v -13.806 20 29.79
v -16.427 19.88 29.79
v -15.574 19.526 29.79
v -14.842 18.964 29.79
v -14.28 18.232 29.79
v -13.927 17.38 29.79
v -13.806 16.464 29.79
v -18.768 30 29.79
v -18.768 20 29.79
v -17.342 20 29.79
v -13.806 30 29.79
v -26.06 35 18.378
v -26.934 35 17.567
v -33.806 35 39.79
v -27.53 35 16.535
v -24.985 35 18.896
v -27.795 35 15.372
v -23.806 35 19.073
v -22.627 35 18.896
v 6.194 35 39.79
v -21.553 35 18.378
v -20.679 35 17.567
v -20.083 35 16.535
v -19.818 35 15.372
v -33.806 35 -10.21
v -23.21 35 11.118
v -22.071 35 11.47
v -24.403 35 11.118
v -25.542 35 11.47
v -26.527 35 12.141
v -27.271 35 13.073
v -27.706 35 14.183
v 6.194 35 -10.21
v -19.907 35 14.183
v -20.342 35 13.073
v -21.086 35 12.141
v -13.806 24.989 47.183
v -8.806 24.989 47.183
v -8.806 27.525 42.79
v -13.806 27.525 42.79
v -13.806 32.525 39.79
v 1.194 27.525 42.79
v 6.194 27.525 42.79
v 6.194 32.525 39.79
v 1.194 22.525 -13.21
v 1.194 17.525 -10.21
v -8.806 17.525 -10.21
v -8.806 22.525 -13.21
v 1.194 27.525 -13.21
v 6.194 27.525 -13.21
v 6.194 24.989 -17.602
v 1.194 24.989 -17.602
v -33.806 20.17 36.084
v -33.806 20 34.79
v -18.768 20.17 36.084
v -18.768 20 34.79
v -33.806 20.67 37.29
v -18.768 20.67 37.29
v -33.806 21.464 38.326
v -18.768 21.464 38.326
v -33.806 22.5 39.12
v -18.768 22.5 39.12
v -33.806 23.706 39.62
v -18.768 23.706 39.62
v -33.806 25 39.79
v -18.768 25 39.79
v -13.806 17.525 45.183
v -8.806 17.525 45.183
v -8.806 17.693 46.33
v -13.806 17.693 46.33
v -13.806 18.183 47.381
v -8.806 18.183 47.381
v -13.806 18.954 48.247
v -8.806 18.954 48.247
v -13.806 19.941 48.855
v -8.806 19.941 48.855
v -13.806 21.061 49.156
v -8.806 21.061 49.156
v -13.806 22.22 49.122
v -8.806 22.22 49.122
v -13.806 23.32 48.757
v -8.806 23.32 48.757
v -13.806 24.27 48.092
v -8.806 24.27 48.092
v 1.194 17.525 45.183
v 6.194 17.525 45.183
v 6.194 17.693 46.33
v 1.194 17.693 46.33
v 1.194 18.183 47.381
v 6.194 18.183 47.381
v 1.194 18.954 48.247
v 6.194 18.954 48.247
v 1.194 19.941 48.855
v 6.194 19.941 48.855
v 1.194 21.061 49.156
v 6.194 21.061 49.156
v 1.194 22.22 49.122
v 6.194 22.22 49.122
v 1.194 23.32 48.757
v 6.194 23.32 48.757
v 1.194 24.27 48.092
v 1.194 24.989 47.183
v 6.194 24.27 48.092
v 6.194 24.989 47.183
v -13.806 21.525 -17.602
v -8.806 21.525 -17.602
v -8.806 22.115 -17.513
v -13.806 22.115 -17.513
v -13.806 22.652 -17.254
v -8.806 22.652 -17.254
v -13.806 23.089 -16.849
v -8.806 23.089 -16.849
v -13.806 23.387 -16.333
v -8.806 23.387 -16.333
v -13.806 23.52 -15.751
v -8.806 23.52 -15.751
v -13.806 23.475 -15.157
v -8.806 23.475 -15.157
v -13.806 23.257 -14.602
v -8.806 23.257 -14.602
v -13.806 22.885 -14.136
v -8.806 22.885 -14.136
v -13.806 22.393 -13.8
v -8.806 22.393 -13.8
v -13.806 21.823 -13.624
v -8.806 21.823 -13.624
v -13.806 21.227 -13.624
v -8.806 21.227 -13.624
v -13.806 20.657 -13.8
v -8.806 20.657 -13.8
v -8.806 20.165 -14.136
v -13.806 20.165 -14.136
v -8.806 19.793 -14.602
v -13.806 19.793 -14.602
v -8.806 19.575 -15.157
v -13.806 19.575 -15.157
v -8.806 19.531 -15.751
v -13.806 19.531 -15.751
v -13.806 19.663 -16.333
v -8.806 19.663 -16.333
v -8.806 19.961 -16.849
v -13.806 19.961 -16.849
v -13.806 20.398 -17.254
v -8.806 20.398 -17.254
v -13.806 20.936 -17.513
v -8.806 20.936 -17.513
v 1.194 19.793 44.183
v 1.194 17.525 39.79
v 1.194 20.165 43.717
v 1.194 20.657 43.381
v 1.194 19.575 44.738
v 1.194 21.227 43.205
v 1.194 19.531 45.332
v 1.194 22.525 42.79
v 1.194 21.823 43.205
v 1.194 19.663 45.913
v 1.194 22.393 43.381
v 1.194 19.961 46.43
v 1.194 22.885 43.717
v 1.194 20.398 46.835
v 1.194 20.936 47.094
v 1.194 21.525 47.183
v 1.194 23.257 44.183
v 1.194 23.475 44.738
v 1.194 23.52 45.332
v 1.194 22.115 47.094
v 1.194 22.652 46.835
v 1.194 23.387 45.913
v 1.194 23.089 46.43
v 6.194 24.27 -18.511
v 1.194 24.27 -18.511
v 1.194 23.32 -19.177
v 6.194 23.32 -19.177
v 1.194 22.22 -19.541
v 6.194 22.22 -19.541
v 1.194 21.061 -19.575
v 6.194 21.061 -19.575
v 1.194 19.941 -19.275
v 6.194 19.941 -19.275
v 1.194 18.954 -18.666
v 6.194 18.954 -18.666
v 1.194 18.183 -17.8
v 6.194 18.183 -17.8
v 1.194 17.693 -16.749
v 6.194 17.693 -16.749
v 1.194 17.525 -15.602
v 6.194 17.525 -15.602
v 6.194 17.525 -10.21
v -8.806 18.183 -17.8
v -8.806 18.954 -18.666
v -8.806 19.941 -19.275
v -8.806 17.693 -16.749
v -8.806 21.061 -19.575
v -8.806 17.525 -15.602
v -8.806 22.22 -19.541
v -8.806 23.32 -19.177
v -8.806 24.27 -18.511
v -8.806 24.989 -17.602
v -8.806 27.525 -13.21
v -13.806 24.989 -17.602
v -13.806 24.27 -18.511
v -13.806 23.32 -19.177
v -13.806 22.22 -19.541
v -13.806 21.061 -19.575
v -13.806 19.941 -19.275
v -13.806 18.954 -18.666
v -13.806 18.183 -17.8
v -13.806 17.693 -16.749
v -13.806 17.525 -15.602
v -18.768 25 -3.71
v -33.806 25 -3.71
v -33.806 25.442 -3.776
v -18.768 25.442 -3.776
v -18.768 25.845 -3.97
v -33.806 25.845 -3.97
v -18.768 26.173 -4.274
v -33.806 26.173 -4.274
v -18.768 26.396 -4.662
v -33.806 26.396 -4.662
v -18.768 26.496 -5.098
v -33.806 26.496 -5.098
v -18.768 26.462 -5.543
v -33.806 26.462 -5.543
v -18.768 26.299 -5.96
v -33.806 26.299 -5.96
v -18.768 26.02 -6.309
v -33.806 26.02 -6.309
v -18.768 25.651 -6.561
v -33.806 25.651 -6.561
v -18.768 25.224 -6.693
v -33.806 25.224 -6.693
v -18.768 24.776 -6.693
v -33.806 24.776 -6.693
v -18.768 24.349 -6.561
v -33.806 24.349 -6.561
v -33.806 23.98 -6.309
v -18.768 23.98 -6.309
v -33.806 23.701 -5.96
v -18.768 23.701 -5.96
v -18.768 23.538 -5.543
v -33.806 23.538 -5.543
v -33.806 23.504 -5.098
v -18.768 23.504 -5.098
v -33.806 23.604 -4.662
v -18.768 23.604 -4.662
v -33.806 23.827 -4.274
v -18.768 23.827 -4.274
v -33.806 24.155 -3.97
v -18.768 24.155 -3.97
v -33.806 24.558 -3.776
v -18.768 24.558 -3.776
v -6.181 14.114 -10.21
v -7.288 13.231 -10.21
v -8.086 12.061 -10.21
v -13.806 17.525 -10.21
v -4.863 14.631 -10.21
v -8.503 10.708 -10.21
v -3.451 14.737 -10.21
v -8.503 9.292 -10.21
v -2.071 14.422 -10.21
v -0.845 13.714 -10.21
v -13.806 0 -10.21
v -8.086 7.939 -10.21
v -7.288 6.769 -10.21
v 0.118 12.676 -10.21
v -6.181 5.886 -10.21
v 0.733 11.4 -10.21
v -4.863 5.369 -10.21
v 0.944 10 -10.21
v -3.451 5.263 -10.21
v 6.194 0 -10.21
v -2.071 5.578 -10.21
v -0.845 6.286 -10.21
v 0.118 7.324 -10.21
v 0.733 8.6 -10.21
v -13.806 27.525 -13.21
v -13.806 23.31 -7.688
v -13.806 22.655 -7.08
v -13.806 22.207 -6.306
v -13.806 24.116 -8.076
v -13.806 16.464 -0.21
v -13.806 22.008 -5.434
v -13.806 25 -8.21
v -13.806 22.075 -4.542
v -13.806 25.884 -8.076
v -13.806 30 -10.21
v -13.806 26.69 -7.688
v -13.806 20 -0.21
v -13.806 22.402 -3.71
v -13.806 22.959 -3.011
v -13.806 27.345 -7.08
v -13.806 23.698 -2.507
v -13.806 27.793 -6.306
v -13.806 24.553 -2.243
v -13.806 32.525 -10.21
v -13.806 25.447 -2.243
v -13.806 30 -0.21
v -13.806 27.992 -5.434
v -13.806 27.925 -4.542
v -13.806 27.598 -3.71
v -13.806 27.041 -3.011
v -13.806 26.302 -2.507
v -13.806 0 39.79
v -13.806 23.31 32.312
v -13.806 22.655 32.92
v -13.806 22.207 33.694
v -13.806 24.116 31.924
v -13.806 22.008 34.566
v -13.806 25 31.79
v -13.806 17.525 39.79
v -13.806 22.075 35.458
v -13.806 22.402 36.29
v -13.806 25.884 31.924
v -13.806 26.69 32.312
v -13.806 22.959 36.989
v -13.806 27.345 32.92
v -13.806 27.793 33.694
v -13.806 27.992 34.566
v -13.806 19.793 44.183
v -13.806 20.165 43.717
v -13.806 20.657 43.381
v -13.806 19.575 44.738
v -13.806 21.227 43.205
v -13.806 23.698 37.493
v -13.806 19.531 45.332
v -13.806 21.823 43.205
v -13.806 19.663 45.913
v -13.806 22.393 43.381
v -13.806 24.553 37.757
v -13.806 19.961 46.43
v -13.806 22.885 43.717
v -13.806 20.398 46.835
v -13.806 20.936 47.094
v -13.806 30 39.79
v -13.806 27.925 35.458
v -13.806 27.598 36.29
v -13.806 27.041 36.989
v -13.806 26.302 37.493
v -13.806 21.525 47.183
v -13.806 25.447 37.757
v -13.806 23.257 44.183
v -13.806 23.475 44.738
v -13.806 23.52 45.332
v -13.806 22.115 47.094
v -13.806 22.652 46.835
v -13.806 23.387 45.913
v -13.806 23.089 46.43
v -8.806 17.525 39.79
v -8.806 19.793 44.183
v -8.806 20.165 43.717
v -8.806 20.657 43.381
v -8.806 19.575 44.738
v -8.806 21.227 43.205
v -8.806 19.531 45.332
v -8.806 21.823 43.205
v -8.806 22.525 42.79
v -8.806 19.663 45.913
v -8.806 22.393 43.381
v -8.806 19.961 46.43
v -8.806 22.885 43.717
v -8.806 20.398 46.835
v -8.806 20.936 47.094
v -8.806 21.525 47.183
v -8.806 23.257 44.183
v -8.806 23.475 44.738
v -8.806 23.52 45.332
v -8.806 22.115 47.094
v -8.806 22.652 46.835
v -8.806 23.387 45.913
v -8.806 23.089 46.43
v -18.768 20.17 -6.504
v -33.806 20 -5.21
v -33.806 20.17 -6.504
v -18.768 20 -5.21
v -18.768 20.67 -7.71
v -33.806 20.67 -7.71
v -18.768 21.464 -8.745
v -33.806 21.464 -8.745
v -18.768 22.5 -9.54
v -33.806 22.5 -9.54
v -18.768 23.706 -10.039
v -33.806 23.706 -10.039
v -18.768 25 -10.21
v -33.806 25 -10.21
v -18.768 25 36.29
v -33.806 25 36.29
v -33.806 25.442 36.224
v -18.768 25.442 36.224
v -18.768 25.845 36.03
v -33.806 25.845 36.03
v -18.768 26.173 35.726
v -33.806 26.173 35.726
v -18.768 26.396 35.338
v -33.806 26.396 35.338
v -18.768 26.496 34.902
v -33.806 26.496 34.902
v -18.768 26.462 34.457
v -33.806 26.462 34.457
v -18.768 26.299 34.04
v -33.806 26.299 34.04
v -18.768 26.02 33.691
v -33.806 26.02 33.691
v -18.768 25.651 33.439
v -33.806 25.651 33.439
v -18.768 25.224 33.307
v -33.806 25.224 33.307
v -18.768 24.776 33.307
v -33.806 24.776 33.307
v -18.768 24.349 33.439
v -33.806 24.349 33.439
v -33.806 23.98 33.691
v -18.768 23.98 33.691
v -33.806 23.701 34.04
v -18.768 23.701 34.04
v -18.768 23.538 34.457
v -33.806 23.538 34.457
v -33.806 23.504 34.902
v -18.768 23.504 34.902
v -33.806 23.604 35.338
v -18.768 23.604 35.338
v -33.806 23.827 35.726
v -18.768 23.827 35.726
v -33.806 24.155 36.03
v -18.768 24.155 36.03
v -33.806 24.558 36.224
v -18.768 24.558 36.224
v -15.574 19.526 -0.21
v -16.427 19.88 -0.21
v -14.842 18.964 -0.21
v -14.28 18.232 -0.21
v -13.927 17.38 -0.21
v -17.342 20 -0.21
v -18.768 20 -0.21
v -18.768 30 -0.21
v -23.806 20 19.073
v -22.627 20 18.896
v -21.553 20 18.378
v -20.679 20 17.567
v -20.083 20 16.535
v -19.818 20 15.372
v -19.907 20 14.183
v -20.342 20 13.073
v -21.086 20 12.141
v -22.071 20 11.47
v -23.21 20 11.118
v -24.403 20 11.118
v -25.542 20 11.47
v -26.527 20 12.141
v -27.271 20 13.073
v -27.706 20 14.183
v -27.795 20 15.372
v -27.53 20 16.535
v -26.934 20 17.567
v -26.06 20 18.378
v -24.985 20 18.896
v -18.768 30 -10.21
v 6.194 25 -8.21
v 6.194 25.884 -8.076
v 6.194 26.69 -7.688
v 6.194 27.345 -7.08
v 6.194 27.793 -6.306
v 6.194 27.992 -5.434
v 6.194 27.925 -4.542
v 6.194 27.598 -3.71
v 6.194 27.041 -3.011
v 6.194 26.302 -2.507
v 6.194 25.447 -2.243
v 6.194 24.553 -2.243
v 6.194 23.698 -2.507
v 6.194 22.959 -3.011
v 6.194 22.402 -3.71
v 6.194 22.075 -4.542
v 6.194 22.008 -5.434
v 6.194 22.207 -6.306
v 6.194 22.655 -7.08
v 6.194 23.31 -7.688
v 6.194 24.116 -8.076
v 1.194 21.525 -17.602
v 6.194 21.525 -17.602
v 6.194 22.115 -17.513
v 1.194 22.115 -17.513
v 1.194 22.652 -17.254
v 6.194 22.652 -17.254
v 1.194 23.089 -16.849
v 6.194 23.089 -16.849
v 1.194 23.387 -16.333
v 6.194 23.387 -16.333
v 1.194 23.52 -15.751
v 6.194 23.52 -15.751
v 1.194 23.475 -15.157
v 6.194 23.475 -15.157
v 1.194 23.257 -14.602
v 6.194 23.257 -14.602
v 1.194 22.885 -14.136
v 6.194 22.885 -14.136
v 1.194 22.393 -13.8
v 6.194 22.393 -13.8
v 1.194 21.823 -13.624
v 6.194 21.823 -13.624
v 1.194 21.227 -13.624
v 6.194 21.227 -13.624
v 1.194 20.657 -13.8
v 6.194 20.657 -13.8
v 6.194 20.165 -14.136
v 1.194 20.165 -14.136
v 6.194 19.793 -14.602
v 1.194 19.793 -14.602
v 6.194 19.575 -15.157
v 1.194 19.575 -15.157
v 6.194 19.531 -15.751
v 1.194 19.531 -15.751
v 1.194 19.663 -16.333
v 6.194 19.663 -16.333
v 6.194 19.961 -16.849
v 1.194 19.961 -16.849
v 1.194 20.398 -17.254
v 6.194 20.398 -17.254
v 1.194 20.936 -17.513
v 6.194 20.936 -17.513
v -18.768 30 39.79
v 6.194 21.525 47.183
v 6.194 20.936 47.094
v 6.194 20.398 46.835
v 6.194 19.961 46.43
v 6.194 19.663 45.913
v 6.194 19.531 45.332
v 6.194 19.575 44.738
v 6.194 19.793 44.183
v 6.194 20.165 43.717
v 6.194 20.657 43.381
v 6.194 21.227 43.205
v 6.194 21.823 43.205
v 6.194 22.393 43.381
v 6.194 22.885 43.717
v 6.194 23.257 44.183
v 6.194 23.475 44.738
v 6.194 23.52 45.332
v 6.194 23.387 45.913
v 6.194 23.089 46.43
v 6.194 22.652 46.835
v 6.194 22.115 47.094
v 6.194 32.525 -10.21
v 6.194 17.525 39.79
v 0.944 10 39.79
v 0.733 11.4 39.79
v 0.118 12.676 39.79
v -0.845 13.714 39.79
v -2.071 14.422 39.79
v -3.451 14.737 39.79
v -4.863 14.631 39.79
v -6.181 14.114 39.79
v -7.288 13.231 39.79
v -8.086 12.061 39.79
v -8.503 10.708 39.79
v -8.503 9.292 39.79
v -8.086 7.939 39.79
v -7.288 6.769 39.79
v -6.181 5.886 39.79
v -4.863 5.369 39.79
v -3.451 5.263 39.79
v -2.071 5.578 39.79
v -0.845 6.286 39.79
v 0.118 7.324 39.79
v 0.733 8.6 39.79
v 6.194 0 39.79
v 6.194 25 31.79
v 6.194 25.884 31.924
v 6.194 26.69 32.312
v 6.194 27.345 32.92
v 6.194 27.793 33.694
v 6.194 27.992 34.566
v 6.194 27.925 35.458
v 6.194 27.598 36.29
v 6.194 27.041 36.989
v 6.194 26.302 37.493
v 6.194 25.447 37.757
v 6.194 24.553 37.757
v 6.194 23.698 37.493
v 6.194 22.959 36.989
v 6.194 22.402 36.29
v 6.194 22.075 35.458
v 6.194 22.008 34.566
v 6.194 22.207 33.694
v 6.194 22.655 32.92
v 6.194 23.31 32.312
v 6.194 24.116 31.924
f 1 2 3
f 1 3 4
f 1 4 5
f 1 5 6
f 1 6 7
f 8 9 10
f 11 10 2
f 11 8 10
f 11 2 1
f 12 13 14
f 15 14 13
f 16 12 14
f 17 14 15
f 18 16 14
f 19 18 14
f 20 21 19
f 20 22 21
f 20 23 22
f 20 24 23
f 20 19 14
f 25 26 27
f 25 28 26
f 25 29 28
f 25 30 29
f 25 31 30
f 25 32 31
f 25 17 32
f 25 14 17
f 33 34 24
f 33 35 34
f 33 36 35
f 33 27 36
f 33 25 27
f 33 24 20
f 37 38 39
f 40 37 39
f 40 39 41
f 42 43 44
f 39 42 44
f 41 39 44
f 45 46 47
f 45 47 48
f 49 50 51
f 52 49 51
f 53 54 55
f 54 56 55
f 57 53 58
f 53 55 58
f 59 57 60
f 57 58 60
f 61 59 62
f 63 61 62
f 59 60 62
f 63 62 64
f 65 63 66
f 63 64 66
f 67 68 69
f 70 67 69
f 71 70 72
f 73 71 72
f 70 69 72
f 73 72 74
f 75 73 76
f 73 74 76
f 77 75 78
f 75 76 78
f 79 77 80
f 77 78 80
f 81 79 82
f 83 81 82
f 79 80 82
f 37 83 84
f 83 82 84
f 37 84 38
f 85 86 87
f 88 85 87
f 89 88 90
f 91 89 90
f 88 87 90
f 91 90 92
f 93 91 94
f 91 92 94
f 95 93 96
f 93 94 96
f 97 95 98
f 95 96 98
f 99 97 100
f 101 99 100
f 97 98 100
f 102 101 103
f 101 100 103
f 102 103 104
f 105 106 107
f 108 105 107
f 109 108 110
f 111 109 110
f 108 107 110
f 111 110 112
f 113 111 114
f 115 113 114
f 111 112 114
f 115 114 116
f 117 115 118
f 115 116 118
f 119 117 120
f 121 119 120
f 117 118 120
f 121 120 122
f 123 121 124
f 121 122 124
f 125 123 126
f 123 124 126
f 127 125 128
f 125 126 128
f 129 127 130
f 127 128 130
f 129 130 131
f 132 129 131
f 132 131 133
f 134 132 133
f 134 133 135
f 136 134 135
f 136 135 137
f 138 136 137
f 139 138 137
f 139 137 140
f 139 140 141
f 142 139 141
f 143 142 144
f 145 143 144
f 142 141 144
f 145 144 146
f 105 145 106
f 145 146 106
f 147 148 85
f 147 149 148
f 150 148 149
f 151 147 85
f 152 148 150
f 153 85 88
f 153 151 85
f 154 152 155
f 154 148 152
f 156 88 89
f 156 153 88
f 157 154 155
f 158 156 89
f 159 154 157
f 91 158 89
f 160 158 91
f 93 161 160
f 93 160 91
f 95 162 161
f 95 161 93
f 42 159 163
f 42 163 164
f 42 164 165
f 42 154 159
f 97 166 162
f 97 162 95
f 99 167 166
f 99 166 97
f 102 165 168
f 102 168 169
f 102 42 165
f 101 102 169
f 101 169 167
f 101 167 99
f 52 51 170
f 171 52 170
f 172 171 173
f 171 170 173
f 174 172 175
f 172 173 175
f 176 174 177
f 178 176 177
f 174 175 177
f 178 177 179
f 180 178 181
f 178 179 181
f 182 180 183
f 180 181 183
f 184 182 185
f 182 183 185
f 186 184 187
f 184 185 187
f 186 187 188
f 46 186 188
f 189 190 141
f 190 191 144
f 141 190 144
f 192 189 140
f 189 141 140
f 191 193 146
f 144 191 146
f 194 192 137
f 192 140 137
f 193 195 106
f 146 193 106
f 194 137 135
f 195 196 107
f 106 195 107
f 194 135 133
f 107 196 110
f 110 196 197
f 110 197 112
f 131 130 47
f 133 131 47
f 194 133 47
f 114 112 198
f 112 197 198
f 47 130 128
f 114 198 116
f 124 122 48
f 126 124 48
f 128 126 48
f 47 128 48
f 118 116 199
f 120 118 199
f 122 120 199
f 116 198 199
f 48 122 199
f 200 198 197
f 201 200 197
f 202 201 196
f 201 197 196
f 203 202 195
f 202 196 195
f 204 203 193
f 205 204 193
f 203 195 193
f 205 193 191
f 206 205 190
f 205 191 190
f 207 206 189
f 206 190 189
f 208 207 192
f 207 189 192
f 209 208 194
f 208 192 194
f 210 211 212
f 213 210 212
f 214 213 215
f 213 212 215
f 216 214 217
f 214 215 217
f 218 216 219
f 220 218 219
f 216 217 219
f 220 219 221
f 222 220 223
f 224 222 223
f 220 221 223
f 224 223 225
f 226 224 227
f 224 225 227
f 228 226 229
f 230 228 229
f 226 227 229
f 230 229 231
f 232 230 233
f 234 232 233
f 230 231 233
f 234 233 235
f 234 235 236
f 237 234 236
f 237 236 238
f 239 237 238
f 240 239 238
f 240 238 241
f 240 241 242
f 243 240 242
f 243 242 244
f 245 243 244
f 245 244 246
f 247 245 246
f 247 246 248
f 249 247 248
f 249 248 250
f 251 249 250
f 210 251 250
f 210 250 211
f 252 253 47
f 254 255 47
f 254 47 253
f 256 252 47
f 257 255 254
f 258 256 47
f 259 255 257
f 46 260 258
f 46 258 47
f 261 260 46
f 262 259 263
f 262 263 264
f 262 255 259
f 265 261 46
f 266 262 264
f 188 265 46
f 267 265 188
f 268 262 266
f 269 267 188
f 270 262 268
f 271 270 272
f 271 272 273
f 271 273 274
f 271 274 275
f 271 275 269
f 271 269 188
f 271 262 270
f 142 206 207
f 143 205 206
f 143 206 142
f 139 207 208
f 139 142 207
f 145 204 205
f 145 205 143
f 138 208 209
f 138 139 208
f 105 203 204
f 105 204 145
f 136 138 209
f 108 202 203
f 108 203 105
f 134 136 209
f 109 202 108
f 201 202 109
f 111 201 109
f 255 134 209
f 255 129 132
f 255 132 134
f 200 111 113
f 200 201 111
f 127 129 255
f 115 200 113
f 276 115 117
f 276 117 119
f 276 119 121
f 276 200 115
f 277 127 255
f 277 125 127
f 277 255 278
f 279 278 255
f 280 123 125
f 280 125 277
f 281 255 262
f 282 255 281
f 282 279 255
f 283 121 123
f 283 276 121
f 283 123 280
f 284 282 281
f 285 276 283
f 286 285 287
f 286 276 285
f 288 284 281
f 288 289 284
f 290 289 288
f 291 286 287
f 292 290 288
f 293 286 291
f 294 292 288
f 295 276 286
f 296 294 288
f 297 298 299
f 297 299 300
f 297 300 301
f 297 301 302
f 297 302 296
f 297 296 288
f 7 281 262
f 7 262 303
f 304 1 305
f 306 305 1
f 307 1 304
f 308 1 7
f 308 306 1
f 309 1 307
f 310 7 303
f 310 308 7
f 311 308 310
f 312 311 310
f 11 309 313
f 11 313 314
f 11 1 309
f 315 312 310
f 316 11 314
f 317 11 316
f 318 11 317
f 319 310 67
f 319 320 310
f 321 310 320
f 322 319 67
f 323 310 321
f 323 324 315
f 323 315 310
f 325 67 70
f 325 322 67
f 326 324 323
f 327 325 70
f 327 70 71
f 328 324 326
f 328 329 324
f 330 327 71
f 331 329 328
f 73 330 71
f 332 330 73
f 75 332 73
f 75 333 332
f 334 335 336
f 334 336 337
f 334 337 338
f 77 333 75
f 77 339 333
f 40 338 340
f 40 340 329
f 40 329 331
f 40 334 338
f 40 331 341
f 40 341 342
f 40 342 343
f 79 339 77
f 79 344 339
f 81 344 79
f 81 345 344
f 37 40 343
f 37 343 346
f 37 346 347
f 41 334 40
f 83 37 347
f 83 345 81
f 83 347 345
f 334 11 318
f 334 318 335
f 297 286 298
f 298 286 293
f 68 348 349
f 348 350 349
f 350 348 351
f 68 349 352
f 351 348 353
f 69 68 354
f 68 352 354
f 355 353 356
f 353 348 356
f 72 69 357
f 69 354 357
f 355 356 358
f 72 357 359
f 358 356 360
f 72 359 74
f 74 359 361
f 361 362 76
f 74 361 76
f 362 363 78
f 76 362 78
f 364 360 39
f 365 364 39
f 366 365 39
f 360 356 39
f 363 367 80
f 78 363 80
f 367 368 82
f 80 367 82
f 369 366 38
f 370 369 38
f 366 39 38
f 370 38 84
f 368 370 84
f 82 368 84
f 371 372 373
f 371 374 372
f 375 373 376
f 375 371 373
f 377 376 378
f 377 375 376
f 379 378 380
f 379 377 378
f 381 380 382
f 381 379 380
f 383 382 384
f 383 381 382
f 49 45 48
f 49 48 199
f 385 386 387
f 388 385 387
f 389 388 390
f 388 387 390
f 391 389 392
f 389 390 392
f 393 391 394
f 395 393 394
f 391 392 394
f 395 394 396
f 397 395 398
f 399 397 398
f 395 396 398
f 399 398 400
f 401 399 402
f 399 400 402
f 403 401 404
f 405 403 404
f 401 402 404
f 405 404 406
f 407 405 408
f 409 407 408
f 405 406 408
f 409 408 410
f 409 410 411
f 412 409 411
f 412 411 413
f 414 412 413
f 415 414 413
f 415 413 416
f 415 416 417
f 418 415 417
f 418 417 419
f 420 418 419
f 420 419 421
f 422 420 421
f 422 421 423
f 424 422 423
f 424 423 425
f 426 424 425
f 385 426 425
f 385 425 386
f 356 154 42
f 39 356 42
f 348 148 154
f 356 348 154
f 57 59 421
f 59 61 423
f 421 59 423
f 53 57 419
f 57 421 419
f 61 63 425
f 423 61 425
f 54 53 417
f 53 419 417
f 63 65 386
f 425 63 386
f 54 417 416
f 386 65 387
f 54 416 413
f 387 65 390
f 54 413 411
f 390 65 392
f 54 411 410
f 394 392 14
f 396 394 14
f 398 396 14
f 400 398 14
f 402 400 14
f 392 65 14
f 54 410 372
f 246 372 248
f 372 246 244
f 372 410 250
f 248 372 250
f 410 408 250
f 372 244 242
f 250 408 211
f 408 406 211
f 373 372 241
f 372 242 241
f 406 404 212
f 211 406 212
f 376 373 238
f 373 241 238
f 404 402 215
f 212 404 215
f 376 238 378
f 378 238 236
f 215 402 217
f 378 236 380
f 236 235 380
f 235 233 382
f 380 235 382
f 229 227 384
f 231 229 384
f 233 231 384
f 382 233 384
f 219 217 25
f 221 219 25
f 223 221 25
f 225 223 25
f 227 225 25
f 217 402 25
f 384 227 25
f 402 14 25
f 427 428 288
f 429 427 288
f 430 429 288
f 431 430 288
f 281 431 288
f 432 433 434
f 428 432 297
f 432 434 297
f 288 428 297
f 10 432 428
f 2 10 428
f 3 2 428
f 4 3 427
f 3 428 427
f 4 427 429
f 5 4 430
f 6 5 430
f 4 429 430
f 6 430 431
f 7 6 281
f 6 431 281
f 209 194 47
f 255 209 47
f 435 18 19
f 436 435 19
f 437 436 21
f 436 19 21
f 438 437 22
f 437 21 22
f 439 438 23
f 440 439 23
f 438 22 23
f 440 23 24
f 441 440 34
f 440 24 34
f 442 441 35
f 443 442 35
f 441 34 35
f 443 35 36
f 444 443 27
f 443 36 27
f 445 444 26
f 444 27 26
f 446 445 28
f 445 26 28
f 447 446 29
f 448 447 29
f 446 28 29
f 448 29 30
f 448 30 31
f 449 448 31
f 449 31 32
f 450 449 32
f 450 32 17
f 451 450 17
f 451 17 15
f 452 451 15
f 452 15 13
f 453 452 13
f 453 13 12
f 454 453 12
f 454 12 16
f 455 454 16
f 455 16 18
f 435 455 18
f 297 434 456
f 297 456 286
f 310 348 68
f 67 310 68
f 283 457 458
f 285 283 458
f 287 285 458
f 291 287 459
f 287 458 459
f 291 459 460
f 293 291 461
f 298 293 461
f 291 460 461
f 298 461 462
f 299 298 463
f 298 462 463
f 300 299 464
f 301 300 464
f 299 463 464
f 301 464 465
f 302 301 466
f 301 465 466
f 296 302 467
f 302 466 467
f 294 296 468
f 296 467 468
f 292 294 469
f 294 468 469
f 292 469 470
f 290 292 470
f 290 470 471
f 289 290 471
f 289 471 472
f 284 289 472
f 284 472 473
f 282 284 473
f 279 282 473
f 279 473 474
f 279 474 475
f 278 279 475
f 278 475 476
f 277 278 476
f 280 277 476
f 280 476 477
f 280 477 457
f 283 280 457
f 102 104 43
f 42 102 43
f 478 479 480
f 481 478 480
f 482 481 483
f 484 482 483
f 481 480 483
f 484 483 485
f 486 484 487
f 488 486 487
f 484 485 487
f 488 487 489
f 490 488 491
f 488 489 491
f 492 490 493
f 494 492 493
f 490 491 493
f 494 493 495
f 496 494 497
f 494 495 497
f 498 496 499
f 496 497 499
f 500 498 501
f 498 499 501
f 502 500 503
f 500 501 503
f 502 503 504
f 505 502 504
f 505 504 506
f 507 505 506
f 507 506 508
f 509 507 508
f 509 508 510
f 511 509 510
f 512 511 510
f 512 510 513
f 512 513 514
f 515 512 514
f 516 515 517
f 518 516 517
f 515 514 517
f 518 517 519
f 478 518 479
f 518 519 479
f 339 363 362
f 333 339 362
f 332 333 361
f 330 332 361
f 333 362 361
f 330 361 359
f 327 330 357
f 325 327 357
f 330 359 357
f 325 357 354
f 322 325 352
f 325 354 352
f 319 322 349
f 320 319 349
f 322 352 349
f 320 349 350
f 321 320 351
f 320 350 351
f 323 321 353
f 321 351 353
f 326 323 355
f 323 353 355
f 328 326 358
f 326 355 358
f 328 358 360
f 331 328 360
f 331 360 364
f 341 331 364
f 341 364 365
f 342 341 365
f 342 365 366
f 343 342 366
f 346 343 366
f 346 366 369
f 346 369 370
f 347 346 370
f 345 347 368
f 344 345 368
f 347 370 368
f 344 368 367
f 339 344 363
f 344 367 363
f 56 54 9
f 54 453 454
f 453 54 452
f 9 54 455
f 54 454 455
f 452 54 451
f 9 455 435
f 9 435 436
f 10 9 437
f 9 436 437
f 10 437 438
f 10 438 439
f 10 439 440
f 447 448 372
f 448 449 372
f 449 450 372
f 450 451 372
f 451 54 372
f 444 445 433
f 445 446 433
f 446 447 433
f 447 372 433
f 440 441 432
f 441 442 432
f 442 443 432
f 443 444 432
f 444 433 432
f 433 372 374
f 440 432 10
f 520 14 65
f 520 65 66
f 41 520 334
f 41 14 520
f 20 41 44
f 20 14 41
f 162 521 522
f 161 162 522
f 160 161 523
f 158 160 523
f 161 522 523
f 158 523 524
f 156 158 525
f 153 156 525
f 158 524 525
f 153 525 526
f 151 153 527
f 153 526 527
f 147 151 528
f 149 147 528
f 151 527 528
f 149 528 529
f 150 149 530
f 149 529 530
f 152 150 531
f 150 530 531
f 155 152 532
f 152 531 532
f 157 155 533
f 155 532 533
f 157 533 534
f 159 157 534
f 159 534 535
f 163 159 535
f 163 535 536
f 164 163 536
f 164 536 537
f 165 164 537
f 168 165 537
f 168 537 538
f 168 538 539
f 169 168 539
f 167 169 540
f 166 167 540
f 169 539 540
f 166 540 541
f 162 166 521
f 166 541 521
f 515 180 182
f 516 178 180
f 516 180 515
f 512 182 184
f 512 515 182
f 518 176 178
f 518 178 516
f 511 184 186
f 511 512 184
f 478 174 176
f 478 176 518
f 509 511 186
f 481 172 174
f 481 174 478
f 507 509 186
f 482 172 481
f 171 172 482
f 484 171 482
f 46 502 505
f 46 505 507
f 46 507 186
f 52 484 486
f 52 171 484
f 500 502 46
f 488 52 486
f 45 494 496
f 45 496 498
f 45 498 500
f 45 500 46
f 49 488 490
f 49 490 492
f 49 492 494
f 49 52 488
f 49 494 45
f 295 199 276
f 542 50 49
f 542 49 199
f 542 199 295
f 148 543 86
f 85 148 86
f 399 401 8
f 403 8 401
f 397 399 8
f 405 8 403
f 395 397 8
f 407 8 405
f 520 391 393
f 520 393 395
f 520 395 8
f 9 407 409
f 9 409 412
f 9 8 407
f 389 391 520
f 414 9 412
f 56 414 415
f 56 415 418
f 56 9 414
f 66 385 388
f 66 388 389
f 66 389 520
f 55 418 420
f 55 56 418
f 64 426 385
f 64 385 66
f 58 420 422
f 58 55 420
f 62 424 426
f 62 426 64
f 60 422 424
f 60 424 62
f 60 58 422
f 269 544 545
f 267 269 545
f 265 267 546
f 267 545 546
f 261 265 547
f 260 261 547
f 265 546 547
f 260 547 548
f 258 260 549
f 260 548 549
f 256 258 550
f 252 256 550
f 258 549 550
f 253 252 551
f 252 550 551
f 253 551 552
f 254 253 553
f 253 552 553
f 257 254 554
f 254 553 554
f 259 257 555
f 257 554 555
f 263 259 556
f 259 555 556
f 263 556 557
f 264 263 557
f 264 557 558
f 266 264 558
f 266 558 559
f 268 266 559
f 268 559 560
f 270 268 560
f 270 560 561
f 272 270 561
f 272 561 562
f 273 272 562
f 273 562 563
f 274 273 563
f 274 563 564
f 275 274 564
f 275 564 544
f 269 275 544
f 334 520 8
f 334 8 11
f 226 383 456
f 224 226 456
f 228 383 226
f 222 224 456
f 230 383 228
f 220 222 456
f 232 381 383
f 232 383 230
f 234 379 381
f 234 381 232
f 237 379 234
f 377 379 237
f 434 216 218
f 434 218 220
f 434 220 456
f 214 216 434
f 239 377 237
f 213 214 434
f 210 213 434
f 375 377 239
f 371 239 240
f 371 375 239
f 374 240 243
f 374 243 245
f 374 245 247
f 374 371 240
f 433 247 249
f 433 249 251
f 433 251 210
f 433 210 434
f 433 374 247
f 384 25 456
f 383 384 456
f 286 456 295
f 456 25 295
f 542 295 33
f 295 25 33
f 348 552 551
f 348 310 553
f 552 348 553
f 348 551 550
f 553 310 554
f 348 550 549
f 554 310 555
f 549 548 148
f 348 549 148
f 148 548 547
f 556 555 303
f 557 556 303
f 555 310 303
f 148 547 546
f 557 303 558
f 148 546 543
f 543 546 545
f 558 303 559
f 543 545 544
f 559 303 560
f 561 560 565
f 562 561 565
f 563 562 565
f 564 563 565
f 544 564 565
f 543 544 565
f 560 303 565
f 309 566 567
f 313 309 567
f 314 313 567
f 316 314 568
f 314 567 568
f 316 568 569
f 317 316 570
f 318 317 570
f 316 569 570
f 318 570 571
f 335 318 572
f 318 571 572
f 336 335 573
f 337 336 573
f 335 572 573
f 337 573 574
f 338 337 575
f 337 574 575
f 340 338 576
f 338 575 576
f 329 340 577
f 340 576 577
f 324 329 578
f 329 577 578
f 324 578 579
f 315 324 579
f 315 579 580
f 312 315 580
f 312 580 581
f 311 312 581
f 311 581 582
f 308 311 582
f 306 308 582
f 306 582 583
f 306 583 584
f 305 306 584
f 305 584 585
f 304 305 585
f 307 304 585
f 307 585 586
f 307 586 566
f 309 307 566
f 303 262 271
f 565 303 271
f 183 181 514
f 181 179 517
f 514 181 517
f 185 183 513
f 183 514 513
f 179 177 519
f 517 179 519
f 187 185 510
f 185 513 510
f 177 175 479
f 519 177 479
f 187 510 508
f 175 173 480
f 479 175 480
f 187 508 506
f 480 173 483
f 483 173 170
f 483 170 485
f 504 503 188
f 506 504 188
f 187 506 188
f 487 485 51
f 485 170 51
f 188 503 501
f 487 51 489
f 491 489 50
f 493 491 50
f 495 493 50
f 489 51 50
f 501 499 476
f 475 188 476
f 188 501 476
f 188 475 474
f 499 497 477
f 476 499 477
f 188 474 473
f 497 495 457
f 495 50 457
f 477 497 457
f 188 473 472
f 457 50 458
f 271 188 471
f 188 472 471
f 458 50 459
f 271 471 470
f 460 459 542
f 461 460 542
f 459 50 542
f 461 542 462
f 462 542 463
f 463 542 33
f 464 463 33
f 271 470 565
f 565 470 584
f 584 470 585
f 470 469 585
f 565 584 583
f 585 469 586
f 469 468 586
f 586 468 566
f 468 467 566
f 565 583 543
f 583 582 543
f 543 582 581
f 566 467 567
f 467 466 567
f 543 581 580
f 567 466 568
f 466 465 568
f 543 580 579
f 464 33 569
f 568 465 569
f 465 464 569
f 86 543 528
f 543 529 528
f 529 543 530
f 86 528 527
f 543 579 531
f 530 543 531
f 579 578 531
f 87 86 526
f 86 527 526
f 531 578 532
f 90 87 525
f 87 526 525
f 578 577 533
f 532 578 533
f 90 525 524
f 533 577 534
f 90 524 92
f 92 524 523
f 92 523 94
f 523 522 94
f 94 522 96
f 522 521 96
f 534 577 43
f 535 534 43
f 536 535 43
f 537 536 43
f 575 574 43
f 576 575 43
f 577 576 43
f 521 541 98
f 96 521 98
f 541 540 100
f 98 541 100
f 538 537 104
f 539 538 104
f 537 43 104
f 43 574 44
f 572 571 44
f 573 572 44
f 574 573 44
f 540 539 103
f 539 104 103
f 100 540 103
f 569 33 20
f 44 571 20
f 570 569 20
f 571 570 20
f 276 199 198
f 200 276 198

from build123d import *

# Parameters (mm, degrees)
SKETCH3_W              = 20
SKETCH3_H              = 50
BOSS_EXTRUDE1_DEPTH    = 35
SKETCH4_R              = 4.75
CUT_EXTRUDE1_DEPTH     = 60
SKETCH5_R              = 3
CUT_EXTRUDE2_DEPTH     = 60
EXTRUDE_2_DEPTH        = 20
SKETCH_3_R             = 2
EXTRUDE_4_DEPTH        = 5
PATTERN_LINEAR_1_COUNT = 2
PATTERN_LINEAR_1_PITCH = 15
SKETCH_5_W             = 20
SKETCH_5_H             = 50
EXTRUDE_5_DEPTH        = 15
SKETCH_6_W             = 4.961104437
SKETCH_6_H             = 10
CUT_EXTRUDE_1_DEPTH    = 10
SKETCH_7_R             = 1.5
CUT_EXTRUDE_2_DEPTH    = 20
SKETCH_8_R             = 4
CUT_EXTRUDE_3_DEPTH    = 20
FILLET_11_R            = 5
FILLET_12_R            = 5
FILLET_START           = -0.209677419
FILLET_13_DEPTH        = 30


with BuildPart() as part:
    # Sketch3 → Boss-Extrude1 (new body)
    with BuildSketch(Plane(origin=(0, 0, 0), x_dir=(1, 0, 0), z_dir=(0, 1, 0))):
        with Locations((-3.806451613, -14.790322581)):
            Rectangle(SKETCH3_W, SKETCH3_H)
    extrude(amount=BOSS_EXTRUDE1_DEPTH)

    # Sketch4 → Cut-Extrude1 (cut)
    with BuildSketch(Plane.XY.offset(39.790322581)):
        with Locations((-3.806451613, 10)):
            Circle(SKETCH4_R)
    extrude(amount=-CUT_EXTRUDE1_DEPTH, mode=Mode.SUBTRACT)

    # Sketch5 → Cut-Extrude2 (cut)
    with BuildSketch(Plane(origin=(6.193548387, 0, 0), x_dir=(0, 0, -1), z_dir=(1, 0, 0))):
        with Locations((-34.790322581, 25)):
            Circle(SKETCH5_R)
        with Locations((5.209677419, 25)):
            Circle(SKETCH5_R)
    extrude(amount=-CUT_EXTRUDE2_DEPTH, mode=Mode.SUBTRACT)

    # 草圖2 → 填料-伸長2 (add)
    with BuildSketch(Plane(origin=(6.193548387, 0, 0), x_dir=(0, 0, -1), z_dir=(1, 0, 0))):
        Polygon((10.209677419, 32.525099494), (10.209677419, 17.525099494), (13.209677419, 22.525099494), (13.209677419, 27.525099494), align=None)
        Polygon((-39.790322581, 17.525099494), (-42.790322581, 22.525099494), (-42.790322581, 27.525099494), (-39.790322581, 32.525099494), align=None)
    extrude(amount=-EXTRUDE_2_DEPTH)

    # 草圖3 → 填料-伸長4 (add)
    # profile 1 of 2: a face of its own
    with BuildSketch(Plane(origin=(6.193548387, 0, 0), x_dir=(0, 0, -1), z_dir=(1, 0, 0))):
        with BuildLine():
            Line((13.209677419, 27.525099494), (17.601982265, 24.989201109))
            ThreePointArc((17.601982265, 24.989201109), (19.46568557, 20.489823314), (15.601982265, 17.525099494))
            Line((15.601982265, 17.525099494), (10.209677419, 17.525099494))
            Line((10.209677419, 17.525099494), (13.209677419, 22.525099494))
            Line((13.209677419, 22.525099494), (13.209677419, 27.525099494))
        make_face()
        with Locations((15.601982265, 21.525099494)):
            Circle(SKETCH_3_R, mode=Mode.SUBTRACT)
    # profile 2 of 2: a face of its own
    with BuildSketch(Plane(origin=(6.193548387, 0, 0), x_dir=(0, 0, -1), z_dir=(1, 0, 0))):
        with BuildLine():
            Line((-39.790322581, 17.525099494), (-45.182627426, 17.525099494))
            ThreePointArc((-45.182627426, 17.525099494), (-49.046330731, 20.489823314), (-47.182627426, 24.989201109))
            Line((-47.182627426, 24.989201109), (-42.790322581, 27.525099494))
            Line((-42.790322581, 27.525099494), (-42.790322581, 22.525099494))
            Line((-42.790322581, 22.525099494), (-39.790322581, 17.525099494))
        make_face()
        with Locations(Location((-45.182627426, 21.525099494, 0), (0, 0, 180))):
            Circle(SKETCH_3_R, mode=Mode.SUBTRACT)
    extrude_4 = extrude(amount=-EXTRUDE_4_DEPTH)

    # 直線複製排列1: 填料-伸長4 ×2
    with Locations(*[(-i * PATTERN_LINEAR_1_PITCH, 0, 0) for i in range(1, PATTERN_LINEAR_1_COUNT)]):
        add(extrude_4)

    # 草圖5 → 填料-伸長5 (add)
    with BuildSketch(Plane(origin=(0, 35, 0), x_dir=(1, 0, 0), z_dir=(0, 1, 0))):
        with Locations((-23.806451613, -14.790322581)):
            Rectangle(SKETCH_5_W, SKETCH_5_H)
    extrude(amount=-EXTRUDE_5_DEPTH)

    # 草圖6 → 除料-伸長1 (cut)
    with BuildSketch(Plane.XZ.offset(-20)):
        with Locations((-16.287003832, -5.209677419)):
            Rectangle(SKETCH_6_W, SKETCH_6_H)
        with Locations((-16.287003832, 34.790322581)):
            Rectangle(SKETCH_6_W, SKETCH_6_H)
    extrude(amount=-CUT_EXTRUDE_1_DEPTH, mode=Mode.SUBTRACT)

    # 草圖7 → 除料-伸長2 (cut)
    with BuildSketch(Plane.ZY.offset(33.806451613)):
        with Locations((-5.209677419, 25)):
            Circle(SKETCH_7_R)
        with Locations((34.790322581, 25)):
            Circle(SKETCH_7_R)
    extrude(amount=-CUT_EXTRUDE_2_DEPTH, mode=Mode.SUBTRACT)

    # 草圖8 → 除料-伸長3 (cut)
    with BuildSketch(Plane(origin=(0, 35, 0), x_dir=(1, 0, 0), z_dir=(0, 1, 0))):
        with Locations(Location((-23.806451613, -15.073492492, 0), (0, 0, 270))):
            Circle(SKETCH_8_R)
    extrude(amount=-CUT_EXTRUDE_3_DEPTH, mode=Mode.SUBTRACT)

    # 圓角11
    fillet_11_edges = [part.edges().sort_by_distance(p)[0] for p in [
        (-26.287003832, 20, -10.209677419),
    ]]
    fillet(fillet_11_edges, radius=FILLET_11_R)

    # 圓角12
    fillet_12_edges = [part.edges().sort_by_distance(p)[0] for p in [
        (-26.287003832, 20, 39.790322581),
    ]]
    fillet(fillet_12_edges, radius=FILLET_12_R)

    # 圓角13: read off the stored shape, not the designer's step
    # 圓角13 outline → 圓角13 (add)
    with BuildSketch(Plane.XY.offset(FILLET_START)):
        with BuildLine():
            Line((-13.806451613, 20), (-17.341985519, 20))
            ThreePointArc((-17.341985519, 20), (-14.841985519, 18.964466094), (-13.806451613, 16.464466094))
            Line((-13.806451613, 16.464466094), (-13.806451613, 20))
        make_face()
    extrude(amount=FILLET_13_DEPTH)


solid = part.part
